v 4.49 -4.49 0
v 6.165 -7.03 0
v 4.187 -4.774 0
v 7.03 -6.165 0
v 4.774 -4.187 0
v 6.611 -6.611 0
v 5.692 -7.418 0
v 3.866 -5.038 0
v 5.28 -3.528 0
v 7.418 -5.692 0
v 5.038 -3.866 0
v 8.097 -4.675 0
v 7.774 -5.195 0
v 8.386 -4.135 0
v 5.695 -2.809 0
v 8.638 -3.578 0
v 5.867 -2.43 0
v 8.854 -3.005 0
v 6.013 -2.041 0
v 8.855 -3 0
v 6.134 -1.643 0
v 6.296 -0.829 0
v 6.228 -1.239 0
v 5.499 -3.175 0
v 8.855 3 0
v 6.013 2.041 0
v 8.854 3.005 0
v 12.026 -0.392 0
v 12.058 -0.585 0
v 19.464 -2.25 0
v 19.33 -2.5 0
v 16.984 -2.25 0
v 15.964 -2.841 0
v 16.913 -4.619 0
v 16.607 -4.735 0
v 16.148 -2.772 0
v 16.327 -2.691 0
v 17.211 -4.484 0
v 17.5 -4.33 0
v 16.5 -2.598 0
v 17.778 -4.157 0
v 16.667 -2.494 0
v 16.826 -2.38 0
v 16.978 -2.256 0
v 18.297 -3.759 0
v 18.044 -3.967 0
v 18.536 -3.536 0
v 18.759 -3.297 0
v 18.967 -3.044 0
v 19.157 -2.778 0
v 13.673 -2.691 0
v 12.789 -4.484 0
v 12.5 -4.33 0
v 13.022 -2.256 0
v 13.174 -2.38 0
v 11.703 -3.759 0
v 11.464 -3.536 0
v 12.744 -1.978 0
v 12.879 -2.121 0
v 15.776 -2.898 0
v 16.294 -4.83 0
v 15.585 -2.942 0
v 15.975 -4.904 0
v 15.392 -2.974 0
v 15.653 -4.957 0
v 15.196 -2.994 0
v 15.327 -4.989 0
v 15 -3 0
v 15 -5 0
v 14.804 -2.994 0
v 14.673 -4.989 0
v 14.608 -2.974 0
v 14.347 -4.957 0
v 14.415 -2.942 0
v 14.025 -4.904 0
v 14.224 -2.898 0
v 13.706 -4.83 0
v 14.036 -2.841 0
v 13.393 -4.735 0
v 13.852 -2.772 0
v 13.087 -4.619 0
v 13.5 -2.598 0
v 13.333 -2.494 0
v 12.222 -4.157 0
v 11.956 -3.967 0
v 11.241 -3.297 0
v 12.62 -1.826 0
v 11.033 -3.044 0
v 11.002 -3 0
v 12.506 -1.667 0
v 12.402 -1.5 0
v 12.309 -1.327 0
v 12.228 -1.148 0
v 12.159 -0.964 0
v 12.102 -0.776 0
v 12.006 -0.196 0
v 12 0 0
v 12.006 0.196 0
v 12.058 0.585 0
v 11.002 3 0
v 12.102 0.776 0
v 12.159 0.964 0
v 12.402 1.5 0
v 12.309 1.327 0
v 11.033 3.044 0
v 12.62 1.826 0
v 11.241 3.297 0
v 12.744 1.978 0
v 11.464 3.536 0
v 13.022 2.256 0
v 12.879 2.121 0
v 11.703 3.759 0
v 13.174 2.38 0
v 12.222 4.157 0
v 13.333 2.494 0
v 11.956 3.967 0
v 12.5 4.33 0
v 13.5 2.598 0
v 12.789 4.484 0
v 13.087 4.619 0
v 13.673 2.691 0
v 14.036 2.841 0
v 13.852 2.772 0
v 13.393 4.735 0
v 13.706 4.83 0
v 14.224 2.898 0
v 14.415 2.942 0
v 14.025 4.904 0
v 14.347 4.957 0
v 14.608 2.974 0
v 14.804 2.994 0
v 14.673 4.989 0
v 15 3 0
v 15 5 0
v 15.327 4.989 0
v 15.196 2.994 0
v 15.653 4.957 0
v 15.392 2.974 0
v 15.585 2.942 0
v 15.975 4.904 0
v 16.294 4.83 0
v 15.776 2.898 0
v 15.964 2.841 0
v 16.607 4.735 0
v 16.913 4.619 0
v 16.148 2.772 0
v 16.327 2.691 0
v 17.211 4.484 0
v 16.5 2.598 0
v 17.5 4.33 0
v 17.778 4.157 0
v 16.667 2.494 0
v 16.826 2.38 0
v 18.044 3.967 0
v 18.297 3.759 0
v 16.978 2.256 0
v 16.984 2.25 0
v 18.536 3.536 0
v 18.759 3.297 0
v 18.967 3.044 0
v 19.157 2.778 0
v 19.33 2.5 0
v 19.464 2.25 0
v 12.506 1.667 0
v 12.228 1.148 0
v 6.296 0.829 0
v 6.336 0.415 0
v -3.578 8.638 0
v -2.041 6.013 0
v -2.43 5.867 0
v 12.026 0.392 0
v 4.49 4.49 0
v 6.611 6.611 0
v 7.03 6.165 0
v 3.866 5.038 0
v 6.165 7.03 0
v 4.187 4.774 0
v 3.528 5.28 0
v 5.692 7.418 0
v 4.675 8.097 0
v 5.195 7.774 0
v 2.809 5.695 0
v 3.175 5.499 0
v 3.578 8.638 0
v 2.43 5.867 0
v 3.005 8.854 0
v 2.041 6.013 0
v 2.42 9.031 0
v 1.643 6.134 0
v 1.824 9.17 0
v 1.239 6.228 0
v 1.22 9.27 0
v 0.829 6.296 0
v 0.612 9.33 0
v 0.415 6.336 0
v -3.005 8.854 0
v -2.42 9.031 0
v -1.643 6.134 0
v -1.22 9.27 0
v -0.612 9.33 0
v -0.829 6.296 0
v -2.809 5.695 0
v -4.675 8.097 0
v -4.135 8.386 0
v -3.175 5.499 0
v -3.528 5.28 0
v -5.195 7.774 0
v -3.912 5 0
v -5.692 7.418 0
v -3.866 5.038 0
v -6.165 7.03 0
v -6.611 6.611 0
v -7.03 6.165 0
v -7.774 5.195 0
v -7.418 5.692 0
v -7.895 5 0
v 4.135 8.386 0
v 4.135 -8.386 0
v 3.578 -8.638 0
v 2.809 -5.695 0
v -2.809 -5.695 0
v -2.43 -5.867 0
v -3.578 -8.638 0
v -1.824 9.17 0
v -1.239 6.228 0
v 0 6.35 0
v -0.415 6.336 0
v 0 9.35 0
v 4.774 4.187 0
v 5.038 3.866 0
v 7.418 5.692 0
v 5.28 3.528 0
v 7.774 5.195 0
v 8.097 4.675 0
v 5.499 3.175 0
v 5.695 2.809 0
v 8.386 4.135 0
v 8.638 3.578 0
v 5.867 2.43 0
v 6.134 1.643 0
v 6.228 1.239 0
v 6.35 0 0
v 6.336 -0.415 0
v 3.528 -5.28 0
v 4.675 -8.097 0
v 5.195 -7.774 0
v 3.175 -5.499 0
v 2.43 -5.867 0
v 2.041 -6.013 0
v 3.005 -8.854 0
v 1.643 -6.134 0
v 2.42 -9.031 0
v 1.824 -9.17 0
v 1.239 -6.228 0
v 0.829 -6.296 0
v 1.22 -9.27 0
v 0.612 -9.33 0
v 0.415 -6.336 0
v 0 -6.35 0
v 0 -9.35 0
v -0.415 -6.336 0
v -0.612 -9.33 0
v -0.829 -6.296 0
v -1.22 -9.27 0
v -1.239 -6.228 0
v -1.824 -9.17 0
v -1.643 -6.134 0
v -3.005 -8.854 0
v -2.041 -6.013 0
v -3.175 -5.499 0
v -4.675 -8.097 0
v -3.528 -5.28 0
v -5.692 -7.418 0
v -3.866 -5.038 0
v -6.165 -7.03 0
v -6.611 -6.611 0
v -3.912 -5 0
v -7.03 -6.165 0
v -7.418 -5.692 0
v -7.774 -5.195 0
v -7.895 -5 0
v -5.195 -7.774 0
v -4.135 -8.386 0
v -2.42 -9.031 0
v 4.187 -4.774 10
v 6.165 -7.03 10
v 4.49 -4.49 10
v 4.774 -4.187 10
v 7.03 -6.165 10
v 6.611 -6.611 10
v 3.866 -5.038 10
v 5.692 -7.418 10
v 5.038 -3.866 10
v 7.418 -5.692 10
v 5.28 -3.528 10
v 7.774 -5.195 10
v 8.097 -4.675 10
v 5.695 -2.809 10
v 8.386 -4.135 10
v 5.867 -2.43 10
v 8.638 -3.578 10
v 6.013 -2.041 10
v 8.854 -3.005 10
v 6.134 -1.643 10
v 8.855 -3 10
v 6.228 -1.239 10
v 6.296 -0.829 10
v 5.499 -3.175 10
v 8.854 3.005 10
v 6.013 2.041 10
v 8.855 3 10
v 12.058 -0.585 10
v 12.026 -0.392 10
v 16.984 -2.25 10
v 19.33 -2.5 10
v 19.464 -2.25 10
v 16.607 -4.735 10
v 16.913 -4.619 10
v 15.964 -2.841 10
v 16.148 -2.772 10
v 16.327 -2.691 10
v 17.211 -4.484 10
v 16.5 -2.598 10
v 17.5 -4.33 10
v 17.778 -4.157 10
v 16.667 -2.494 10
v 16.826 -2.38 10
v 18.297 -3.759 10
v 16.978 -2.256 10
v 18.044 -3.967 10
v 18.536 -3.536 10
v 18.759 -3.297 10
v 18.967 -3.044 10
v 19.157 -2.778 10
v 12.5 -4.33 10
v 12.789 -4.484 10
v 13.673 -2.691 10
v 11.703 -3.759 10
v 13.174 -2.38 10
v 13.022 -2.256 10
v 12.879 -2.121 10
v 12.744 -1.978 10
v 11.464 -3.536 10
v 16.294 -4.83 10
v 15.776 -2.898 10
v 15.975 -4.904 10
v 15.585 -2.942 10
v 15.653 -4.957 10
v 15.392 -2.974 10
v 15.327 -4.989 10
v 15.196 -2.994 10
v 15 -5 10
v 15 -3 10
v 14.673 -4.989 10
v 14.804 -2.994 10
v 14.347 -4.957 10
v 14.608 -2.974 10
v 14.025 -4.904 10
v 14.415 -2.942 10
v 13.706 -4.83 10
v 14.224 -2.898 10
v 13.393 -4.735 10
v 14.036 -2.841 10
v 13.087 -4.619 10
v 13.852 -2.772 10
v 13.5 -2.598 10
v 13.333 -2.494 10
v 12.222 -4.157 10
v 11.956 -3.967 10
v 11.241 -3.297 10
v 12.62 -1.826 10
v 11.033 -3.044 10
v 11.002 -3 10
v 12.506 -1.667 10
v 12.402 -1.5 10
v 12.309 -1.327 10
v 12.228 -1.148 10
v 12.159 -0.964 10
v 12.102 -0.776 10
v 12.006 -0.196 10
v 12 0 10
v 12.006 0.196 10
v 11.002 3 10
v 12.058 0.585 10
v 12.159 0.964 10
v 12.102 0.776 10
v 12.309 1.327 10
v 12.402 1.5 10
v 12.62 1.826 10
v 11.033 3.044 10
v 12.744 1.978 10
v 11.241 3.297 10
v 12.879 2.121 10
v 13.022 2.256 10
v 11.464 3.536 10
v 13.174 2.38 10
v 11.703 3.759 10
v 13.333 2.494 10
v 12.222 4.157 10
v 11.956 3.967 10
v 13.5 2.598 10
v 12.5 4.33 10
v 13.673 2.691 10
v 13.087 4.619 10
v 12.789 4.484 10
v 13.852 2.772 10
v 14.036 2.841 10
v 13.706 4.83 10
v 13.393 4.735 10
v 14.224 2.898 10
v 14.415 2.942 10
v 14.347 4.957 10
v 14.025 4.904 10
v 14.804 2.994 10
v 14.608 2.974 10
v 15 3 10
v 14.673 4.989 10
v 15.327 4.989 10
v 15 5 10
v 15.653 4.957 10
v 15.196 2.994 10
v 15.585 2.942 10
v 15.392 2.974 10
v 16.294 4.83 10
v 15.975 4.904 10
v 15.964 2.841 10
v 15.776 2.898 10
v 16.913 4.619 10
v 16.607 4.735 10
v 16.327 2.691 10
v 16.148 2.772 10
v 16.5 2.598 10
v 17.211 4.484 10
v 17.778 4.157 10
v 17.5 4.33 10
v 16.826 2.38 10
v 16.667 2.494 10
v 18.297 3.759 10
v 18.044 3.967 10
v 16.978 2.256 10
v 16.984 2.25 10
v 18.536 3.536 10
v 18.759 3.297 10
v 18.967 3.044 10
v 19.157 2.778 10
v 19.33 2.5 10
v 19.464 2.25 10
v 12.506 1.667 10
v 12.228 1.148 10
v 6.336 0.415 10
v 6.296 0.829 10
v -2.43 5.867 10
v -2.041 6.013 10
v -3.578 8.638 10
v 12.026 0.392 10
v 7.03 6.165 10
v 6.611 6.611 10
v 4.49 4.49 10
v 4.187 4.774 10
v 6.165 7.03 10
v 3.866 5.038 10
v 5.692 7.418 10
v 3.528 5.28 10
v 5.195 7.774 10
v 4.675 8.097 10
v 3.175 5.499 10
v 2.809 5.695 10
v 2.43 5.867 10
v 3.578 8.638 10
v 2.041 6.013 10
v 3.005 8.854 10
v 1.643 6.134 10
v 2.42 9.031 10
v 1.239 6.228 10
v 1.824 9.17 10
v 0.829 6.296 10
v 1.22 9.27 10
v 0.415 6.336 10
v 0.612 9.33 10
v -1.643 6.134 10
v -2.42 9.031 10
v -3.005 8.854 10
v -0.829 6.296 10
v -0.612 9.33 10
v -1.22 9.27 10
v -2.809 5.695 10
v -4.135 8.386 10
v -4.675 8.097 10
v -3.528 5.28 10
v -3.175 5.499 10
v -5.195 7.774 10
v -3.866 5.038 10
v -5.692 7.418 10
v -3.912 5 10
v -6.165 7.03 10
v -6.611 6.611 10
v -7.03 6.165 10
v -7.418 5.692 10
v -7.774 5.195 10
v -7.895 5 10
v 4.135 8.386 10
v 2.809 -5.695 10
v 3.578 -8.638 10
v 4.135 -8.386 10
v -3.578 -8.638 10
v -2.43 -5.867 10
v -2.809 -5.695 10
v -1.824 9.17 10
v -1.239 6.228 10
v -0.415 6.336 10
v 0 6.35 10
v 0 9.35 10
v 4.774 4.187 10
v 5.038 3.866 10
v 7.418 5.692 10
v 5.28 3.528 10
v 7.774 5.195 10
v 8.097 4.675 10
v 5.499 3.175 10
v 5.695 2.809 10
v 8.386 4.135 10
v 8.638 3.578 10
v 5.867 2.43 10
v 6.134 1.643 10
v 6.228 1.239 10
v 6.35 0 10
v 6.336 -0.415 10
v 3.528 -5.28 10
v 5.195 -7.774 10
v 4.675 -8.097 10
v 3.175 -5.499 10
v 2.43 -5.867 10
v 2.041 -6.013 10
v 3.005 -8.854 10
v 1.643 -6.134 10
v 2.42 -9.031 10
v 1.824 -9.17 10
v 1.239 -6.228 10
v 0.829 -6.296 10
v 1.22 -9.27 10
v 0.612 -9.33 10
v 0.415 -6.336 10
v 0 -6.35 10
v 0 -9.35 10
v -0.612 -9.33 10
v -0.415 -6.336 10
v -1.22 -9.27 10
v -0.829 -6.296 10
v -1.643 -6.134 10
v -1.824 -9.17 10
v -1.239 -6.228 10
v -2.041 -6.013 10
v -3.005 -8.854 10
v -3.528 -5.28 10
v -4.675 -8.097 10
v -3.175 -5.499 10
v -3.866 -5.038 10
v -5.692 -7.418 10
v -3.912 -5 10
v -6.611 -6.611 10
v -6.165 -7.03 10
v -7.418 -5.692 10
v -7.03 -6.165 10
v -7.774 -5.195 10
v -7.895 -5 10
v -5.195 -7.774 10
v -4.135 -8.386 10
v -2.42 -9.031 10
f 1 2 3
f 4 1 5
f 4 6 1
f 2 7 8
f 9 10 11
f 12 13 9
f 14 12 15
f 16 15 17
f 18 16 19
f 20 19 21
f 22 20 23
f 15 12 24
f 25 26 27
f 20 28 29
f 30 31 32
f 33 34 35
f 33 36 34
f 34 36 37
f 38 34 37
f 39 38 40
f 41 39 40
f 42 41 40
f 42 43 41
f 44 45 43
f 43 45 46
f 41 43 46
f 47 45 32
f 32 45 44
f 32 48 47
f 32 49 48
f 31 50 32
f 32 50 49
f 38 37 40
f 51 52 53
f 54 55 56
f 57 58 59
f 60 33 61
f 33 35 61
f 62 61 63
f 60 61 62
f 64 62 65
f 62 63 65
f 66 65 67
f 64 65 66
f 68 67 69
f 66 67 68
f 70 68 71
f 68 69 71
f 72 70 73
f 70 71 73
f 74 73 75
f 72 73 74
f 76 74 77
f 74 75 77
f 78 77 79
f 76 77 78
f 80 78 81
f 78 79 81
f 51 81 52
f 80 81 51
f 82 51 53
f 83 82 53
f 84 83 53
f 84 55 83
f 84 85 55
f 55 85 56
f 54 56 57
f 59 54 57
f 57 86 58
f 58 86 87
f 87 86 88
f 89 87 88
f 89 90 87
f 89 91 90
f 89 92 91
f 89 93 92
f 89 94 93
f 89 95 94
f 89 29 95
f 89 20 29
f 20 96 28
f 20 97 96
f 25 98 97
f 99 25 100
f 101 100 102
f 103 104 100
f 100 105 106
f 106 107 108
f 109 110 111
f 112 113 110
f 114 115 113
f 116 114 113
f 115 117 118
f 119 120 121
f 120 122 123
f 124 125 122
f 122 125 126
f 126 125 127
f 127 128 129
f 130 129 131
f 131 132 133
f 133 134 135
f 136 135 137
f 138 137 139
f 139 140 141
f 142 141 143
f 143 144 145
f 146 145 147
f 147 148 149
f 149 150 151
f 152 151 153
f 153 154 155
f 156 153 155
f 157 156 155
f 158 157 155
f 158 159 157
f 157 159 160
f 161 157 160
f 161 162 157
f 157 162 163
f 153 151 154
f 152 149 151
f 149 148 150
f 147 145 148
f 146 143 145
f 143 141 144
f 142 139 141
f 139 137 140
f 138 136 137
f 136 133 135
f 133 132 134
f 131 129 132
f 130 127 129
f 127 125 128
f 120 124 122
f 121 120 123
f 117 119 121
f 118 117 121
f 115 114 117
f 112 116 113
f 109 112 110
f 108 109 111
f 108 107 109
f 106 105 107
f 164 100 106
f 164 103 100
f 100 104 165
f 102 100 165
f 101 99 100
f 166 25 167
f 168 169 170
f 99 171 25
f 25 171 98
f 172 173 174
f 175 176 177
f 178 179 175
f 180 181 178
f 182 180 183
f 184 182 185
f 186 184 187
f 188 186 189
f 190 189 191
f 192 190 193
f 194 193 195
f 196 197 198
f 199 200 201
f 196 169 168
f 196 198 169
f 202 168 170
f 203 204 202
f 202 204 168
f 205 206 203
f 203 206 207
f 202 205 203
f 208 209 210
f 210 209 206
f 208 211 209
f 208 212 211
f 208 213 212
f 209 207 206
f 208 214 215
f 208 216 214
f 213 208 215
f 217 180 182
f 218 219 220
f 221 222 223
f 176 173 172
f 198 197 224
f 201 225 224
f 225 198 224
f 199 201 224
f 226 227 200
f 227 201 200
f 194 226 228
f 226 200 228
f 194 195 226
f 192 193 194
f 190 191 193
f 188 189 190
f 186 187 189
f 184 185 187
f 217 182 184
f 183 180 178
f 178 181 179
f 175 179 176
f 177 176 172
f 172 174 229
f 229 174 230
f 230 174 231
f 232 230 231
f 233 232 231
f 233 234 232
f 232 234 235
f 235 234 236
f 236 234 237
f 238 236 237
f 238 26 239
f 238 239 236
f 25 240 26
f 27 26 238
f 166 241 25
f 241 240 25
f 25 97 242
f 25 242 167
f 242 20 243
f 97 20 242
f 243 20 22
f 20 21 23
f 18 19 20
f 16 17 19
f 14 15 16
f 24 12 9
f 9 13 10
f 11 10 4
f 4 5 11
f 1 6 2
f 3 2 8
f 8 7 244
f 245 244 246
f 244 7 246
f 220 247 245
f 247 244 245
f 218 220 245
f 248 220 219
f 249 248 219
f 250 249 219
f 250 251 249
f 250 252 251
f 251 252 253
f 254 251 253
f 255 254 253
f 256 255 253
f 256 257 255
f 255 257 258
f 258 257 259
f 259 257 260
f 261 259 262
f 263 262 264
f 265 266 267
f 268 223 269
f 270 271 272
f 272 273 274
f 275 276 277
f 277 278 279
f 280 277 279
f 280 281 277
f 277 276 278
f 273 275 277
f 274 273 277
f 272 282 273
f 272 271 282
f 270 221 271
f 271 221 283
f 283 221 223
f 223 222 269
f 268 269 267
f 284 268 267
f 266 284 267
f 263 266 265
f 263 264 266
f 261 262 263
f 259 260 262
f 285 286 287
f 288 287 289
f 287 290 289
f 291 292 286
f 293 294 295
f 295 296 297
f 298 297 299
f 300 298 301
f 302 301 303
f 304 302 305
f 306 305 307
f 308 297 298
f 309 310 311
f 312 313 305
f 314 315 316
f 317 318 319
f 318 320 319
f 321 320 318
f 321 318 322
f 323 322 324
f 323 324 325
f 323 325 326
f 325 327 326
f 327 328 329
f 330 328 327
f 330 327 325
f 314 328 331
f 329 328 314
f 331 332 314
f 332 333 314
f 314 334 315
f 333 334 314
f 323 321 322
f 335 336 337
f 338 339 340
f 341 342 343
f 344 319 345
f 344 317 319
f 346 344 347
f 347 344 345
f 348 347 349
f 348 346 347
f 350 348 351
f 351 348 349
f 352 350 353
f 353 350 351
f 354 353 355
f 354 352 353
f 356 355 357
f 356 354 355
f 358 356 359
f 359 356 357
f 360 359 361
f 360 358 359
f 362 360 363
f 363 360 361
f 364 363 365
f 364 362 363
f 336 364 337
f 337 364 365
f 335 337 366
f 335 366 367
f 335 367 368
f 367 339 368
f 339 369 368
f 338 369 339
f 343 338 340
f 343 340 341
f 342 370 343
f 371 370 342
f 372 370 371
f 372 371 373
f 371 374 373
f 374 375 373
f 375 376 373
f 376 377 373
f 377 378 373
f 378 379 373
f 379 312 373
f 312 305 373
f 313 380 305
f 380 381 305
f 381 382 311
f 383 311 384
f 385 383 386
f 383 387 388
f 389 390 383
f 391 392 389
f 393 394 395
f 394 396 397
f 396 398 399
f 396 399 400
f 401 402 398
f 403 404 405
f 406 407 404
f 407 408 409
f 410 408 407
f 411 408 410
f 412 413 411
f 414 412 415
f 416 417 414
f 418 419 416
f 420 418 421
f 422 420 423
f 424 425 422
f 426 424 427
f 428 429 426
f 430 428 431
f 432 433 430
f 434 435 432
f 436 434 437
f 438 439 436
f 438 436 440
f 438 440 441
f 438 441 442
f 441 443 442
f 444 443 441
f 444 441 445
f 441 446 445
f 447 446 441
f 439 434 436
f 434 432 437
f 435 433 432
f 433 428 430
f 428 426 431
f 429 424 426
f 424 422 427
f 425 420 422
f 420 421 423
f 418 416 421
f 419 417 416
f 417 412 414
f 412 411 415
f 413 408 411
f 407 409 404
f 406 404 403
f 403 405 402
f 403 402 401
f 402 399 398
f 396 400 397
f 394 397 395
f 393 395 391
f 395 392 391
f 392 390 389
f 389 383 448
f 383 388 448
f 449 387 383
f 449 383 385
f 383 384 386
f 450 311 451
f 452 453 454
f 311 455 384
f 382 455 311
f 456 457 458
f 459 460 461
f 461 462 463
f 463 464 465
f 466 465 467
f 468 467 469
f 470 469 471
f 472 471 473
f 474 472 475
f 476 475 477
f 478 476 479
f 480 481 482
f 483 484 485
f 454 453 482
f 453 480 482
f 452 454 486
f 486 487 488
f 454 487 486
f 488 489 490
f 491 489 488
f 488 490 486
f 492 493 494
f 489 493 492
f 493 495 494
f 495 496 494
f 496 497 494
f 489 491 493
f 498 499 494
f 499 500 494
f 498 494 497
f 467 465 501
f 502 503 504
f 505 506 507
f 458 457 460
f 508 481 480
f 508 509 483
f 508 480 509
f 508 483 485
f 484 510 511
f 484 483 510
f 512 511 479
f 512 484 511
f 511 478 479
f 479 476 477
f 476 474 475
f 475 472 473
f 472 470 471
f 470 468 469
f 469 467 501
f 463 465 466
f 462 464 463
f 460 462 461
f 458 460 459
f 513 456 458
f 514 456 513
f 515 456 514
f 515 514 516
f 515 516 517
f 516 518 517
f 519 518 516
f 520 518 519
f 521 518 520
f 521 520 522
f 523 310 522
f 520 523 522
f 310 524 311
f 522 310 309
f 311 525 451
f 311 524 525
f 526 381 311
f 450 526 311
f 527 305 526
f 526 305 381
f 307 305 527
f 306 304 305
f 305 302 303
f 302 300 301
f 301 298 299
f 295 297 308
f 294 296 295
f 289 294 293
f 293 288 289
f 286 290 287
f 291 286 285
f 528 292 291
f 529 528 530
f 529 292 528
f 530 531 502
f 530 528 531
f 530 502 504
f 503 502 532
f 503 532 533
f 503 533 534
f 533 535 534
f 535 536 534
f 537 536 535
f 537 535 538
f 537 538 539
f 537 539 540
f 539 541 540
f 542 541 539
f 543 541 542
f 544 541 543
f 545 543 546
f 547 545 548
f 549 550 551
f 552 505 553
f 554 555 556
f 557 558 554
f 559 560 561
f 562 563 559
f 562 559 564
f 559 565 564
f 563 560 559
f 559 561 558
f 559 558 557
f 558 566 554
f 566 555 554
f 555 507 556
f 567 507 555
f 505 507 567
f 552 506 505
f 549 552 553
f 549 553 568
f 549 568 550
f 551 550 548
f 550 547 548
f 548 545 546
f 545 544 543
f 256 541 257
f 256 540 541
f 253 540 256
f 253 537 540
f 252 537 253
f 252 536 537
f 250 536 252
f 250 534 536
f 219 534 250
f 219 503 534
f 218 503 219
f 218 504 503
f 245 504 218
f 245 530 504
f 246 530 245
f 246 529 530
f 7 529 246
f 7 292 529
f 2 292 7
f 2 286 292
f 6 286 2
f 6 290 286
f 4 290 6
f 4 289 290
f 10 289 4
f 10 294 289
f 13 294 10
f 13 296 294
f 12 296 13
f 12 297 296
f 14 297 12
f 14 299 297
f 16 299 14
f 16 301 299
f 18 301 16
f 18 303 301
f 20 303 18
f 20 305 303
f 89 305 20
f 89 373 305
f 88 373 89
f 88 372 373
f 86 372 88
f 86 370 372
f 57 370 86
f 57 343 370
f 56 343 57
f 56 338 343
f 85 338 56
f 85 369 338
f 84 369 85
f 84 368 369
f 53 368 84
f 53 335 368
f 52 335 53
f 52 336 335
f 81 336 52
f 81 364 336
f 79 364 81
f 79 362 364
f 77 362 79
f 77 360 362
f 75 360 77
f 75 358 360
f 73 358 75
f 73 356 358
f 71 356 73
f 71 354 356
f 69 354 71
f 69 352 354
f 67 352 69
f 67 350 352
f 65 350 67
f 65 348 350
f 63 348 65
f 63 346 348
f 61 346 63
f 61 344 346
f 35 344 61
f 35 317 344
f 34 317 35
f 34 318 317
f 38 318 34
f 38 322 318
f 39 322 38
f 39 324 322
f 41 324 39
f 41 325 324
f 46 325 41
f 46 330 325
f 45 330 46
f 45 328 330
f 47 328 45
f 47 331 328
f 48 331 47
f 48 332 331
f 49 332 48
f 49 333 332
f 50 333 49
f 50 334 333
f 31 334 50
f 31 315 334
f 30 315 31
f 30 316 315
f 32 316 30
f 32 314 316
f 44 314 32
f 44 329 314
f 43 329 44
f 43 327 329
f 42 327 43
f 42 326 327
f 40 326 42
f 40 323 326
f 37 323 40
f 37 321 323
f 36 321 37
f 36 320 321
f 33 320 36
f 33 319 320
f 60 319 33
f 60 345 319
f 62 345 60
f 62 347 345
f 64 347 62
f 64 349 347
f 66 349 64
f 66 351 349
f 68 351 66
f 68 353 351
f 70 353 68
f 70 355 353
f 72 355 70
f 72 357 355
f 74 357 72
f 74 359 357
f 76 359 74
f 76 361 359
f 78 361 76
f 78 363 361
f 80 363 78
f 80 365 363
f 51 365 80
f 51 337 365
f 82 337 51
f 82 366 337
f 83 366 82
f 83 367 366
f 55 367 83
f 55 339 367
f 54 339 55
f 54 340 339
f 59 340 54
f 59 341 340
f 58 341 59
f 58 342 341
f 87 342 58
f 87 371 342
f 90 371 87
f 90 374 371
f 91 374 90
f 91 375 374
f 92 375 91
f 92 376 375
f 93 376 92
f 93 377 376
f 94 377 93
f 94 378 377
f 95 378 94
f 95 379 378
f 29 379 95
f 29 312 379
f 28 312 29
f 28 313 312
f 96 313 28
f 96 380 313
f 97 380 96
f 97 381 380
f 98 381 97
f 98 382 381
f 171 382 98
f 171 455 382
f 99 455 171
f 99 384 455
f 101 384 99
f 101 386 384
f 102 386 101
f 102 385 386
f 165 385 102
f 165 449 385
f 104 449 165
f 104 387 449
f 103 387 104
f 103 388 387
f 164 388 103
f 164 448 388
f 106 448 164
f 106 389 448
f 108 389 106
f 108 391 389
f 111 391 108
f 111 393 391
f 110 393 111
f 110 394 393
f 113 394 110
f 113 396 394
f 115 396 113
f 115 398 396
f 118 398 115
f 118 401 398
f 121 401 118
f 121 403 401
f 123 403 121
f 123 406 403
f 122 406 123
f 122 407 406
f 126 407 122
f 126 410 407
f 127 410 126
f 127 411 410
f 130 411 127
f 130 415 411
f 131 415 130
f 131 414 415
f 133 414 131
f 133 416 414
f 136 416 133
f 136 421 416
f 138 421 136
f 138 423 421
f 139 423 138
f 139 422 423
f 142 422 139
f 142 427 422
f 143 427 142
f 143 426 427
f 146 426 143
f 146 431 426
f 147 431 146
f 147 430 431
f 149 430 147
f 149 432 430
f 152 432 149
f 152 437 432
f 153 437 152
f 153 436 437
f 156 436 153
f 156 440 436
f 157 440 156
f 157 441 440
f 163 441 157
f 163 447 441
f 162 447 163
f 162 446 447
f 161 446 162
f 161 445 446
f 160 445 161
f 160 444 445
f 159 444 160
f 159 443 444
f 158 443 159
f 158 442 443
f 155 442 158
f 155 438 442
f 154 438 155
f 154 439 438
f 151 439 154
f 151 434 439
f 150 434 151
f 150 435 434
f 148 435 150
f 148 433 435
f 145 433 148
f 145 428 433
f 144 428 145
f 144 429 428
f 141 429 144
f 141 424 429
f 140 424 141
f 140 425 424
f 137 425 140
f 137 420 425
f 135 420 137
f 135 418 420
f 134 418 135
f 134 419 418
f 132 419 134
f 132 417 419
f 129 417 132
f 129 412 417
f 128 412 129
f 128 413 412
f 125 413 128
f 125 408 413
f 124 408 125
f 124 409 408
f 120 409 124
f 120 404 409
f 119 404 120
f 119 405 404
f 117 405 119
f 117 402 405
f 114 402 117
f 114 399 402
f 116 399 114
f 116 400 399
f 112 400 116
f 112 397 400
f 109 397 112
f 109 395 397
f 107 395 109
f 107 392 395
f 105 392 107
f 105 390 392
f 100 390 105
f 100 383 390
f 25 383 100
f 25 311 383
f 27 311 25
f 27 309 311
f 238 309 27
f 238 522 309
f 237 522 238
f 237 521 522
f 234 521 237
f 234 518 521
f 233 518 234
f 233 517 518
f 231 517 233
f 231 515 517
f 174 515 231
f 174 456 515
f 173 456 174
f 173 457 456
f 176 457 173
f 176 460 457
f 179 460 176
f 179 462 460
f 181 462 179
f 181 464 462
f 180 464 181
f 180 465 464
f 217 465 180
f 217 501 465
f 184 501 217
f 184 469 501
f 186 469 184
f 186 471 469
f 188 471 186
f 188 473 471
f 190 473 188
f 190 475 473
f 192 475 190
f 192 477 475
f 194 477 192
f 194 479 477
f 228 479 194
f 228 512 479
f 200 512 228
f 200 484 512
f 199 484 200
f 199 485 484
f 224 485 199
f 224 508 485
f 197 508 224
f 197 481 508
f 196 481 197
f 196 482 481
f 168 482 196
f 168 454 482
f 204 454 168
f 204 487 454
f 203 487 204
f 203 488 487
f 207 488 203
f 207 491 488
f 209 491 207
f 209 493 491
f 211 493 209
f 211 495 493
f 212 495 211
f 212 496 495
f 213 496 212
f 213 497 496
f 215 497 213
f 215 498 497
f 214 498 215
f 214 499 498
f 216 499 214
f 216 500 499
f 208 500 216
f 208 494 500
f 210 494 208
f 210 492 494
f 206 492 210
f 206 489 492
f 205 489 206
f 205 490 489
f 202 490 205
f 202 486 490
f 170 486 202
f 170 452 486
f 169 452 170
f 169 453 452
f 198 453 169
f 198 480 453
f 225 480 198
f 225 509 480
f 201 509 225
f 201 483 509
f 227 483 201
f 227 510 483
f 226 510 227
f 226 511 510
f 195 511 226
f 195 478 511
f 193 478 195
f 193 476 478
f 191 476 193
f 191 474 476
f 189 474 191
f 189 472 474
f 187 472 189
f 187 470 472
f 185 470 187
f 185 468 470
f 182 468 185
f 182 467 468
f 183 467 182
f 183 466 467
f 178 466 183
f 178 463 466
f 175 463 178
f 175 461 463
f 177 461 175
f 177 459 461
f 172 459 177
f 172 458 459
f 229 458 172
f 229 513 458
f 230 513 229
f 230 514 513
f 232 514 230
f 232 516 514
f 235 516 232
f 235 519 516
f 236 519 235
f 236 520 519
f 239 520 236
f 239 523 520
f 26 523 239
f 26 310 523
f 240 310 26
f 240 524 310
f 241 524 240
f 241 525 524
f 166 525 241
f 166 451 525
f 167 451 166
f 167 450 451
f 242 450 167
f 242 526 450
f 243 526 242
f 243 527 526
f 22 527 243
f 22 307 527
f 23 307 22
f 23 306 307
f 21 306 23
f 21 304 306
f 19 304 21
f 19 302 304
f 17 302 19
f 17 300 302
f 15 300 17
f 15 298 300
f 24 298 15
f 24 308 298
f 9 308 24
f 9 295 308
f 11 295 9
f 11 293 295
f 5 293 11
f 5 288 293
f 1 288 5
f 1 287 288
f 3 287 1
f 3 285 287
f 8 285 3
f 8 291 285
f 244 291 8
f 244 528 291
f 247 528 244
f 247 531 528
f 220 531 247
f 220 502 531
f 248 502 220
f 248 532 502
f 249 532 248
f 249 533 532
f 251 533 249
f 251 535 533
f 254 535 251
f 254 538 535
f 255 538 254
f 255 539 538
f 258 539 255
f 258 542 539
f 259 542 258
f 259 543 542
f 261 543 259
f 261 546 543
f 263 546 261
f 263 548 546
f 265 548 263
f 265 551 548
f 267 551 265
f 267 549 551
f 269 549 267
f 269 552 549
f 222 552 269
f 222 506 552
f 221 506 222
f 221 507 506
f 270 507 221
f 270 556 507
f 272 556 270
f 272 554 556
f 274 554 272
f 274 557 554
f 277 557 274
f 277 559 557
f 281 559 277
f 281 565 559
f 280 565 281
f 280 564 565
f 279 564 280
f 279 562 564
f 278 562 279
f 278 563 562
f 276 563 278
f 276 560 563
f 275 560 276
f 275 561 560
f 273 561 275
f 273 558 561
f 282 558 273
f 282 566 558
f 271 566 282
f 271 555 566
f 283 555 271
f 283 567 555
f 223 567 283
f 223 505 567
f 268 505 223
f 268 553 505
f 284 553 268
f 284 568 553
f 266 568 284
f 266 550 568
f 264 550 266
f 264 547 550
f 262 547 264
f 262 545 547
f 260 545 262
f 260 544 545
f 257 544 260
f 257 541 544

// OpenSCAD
// Snap-on clip: rod ring + tubing ring joined by a bridge
$fn = 96;

h = 10;               // extrusion height (Z)

rod_id = 12.7;        // rod ring inner diameter
rod_wall = 3;         // rod ring wall thickness
rod_open_w = 10;      // rod ring opening width (Y), on -X side

tube_id = 6;          // tubing ring inner diameter
tube_wall = 2;        // tubing ring wall thickness
tube_x = 15;          // tubing ring centre X
tube_open_w = 4.5;    // tubing ring opening width (Y), on +X side

bridge_w = 6;         // bridge width (Y)
bridge_x0 = 8;        // bridge start X
bridge_x1 = 12;       // bridge end X

ext = 1;              // cutter overshoot

rod_od = rod_id + 2*rod_wall;
tube_od = tube_id + 2*tube_wall;

module profile() {
    difference() {
        union() {
            circle(d = rod_od);
            translate([tube_x, 0]) circle(d = tube_od);
            translate([bridge_x0, -bridge_w/2])
                square([bridge_x1 - bridge_x0, bridge_w]);
        }
        // holes
        circle(d = rod_id);
        translate([tube_x, 0]) circle(d = tube_id);
        // rod ring opening: x < 0, |y| < rod_open_w/2
        translate([-rod_od/2 - ext, -rod_open_w/2])
            square([rod_od/2 + ext, rod_open_w]);
        // tubing ring opening: x > tube_x, |y| < tube_open_w/2
        translate([tube_x, -tube_open_w/2])
            square([tube_od/2 + ext, tube_open_w]);
    }
}

linear_extrude(height = h) profile();
